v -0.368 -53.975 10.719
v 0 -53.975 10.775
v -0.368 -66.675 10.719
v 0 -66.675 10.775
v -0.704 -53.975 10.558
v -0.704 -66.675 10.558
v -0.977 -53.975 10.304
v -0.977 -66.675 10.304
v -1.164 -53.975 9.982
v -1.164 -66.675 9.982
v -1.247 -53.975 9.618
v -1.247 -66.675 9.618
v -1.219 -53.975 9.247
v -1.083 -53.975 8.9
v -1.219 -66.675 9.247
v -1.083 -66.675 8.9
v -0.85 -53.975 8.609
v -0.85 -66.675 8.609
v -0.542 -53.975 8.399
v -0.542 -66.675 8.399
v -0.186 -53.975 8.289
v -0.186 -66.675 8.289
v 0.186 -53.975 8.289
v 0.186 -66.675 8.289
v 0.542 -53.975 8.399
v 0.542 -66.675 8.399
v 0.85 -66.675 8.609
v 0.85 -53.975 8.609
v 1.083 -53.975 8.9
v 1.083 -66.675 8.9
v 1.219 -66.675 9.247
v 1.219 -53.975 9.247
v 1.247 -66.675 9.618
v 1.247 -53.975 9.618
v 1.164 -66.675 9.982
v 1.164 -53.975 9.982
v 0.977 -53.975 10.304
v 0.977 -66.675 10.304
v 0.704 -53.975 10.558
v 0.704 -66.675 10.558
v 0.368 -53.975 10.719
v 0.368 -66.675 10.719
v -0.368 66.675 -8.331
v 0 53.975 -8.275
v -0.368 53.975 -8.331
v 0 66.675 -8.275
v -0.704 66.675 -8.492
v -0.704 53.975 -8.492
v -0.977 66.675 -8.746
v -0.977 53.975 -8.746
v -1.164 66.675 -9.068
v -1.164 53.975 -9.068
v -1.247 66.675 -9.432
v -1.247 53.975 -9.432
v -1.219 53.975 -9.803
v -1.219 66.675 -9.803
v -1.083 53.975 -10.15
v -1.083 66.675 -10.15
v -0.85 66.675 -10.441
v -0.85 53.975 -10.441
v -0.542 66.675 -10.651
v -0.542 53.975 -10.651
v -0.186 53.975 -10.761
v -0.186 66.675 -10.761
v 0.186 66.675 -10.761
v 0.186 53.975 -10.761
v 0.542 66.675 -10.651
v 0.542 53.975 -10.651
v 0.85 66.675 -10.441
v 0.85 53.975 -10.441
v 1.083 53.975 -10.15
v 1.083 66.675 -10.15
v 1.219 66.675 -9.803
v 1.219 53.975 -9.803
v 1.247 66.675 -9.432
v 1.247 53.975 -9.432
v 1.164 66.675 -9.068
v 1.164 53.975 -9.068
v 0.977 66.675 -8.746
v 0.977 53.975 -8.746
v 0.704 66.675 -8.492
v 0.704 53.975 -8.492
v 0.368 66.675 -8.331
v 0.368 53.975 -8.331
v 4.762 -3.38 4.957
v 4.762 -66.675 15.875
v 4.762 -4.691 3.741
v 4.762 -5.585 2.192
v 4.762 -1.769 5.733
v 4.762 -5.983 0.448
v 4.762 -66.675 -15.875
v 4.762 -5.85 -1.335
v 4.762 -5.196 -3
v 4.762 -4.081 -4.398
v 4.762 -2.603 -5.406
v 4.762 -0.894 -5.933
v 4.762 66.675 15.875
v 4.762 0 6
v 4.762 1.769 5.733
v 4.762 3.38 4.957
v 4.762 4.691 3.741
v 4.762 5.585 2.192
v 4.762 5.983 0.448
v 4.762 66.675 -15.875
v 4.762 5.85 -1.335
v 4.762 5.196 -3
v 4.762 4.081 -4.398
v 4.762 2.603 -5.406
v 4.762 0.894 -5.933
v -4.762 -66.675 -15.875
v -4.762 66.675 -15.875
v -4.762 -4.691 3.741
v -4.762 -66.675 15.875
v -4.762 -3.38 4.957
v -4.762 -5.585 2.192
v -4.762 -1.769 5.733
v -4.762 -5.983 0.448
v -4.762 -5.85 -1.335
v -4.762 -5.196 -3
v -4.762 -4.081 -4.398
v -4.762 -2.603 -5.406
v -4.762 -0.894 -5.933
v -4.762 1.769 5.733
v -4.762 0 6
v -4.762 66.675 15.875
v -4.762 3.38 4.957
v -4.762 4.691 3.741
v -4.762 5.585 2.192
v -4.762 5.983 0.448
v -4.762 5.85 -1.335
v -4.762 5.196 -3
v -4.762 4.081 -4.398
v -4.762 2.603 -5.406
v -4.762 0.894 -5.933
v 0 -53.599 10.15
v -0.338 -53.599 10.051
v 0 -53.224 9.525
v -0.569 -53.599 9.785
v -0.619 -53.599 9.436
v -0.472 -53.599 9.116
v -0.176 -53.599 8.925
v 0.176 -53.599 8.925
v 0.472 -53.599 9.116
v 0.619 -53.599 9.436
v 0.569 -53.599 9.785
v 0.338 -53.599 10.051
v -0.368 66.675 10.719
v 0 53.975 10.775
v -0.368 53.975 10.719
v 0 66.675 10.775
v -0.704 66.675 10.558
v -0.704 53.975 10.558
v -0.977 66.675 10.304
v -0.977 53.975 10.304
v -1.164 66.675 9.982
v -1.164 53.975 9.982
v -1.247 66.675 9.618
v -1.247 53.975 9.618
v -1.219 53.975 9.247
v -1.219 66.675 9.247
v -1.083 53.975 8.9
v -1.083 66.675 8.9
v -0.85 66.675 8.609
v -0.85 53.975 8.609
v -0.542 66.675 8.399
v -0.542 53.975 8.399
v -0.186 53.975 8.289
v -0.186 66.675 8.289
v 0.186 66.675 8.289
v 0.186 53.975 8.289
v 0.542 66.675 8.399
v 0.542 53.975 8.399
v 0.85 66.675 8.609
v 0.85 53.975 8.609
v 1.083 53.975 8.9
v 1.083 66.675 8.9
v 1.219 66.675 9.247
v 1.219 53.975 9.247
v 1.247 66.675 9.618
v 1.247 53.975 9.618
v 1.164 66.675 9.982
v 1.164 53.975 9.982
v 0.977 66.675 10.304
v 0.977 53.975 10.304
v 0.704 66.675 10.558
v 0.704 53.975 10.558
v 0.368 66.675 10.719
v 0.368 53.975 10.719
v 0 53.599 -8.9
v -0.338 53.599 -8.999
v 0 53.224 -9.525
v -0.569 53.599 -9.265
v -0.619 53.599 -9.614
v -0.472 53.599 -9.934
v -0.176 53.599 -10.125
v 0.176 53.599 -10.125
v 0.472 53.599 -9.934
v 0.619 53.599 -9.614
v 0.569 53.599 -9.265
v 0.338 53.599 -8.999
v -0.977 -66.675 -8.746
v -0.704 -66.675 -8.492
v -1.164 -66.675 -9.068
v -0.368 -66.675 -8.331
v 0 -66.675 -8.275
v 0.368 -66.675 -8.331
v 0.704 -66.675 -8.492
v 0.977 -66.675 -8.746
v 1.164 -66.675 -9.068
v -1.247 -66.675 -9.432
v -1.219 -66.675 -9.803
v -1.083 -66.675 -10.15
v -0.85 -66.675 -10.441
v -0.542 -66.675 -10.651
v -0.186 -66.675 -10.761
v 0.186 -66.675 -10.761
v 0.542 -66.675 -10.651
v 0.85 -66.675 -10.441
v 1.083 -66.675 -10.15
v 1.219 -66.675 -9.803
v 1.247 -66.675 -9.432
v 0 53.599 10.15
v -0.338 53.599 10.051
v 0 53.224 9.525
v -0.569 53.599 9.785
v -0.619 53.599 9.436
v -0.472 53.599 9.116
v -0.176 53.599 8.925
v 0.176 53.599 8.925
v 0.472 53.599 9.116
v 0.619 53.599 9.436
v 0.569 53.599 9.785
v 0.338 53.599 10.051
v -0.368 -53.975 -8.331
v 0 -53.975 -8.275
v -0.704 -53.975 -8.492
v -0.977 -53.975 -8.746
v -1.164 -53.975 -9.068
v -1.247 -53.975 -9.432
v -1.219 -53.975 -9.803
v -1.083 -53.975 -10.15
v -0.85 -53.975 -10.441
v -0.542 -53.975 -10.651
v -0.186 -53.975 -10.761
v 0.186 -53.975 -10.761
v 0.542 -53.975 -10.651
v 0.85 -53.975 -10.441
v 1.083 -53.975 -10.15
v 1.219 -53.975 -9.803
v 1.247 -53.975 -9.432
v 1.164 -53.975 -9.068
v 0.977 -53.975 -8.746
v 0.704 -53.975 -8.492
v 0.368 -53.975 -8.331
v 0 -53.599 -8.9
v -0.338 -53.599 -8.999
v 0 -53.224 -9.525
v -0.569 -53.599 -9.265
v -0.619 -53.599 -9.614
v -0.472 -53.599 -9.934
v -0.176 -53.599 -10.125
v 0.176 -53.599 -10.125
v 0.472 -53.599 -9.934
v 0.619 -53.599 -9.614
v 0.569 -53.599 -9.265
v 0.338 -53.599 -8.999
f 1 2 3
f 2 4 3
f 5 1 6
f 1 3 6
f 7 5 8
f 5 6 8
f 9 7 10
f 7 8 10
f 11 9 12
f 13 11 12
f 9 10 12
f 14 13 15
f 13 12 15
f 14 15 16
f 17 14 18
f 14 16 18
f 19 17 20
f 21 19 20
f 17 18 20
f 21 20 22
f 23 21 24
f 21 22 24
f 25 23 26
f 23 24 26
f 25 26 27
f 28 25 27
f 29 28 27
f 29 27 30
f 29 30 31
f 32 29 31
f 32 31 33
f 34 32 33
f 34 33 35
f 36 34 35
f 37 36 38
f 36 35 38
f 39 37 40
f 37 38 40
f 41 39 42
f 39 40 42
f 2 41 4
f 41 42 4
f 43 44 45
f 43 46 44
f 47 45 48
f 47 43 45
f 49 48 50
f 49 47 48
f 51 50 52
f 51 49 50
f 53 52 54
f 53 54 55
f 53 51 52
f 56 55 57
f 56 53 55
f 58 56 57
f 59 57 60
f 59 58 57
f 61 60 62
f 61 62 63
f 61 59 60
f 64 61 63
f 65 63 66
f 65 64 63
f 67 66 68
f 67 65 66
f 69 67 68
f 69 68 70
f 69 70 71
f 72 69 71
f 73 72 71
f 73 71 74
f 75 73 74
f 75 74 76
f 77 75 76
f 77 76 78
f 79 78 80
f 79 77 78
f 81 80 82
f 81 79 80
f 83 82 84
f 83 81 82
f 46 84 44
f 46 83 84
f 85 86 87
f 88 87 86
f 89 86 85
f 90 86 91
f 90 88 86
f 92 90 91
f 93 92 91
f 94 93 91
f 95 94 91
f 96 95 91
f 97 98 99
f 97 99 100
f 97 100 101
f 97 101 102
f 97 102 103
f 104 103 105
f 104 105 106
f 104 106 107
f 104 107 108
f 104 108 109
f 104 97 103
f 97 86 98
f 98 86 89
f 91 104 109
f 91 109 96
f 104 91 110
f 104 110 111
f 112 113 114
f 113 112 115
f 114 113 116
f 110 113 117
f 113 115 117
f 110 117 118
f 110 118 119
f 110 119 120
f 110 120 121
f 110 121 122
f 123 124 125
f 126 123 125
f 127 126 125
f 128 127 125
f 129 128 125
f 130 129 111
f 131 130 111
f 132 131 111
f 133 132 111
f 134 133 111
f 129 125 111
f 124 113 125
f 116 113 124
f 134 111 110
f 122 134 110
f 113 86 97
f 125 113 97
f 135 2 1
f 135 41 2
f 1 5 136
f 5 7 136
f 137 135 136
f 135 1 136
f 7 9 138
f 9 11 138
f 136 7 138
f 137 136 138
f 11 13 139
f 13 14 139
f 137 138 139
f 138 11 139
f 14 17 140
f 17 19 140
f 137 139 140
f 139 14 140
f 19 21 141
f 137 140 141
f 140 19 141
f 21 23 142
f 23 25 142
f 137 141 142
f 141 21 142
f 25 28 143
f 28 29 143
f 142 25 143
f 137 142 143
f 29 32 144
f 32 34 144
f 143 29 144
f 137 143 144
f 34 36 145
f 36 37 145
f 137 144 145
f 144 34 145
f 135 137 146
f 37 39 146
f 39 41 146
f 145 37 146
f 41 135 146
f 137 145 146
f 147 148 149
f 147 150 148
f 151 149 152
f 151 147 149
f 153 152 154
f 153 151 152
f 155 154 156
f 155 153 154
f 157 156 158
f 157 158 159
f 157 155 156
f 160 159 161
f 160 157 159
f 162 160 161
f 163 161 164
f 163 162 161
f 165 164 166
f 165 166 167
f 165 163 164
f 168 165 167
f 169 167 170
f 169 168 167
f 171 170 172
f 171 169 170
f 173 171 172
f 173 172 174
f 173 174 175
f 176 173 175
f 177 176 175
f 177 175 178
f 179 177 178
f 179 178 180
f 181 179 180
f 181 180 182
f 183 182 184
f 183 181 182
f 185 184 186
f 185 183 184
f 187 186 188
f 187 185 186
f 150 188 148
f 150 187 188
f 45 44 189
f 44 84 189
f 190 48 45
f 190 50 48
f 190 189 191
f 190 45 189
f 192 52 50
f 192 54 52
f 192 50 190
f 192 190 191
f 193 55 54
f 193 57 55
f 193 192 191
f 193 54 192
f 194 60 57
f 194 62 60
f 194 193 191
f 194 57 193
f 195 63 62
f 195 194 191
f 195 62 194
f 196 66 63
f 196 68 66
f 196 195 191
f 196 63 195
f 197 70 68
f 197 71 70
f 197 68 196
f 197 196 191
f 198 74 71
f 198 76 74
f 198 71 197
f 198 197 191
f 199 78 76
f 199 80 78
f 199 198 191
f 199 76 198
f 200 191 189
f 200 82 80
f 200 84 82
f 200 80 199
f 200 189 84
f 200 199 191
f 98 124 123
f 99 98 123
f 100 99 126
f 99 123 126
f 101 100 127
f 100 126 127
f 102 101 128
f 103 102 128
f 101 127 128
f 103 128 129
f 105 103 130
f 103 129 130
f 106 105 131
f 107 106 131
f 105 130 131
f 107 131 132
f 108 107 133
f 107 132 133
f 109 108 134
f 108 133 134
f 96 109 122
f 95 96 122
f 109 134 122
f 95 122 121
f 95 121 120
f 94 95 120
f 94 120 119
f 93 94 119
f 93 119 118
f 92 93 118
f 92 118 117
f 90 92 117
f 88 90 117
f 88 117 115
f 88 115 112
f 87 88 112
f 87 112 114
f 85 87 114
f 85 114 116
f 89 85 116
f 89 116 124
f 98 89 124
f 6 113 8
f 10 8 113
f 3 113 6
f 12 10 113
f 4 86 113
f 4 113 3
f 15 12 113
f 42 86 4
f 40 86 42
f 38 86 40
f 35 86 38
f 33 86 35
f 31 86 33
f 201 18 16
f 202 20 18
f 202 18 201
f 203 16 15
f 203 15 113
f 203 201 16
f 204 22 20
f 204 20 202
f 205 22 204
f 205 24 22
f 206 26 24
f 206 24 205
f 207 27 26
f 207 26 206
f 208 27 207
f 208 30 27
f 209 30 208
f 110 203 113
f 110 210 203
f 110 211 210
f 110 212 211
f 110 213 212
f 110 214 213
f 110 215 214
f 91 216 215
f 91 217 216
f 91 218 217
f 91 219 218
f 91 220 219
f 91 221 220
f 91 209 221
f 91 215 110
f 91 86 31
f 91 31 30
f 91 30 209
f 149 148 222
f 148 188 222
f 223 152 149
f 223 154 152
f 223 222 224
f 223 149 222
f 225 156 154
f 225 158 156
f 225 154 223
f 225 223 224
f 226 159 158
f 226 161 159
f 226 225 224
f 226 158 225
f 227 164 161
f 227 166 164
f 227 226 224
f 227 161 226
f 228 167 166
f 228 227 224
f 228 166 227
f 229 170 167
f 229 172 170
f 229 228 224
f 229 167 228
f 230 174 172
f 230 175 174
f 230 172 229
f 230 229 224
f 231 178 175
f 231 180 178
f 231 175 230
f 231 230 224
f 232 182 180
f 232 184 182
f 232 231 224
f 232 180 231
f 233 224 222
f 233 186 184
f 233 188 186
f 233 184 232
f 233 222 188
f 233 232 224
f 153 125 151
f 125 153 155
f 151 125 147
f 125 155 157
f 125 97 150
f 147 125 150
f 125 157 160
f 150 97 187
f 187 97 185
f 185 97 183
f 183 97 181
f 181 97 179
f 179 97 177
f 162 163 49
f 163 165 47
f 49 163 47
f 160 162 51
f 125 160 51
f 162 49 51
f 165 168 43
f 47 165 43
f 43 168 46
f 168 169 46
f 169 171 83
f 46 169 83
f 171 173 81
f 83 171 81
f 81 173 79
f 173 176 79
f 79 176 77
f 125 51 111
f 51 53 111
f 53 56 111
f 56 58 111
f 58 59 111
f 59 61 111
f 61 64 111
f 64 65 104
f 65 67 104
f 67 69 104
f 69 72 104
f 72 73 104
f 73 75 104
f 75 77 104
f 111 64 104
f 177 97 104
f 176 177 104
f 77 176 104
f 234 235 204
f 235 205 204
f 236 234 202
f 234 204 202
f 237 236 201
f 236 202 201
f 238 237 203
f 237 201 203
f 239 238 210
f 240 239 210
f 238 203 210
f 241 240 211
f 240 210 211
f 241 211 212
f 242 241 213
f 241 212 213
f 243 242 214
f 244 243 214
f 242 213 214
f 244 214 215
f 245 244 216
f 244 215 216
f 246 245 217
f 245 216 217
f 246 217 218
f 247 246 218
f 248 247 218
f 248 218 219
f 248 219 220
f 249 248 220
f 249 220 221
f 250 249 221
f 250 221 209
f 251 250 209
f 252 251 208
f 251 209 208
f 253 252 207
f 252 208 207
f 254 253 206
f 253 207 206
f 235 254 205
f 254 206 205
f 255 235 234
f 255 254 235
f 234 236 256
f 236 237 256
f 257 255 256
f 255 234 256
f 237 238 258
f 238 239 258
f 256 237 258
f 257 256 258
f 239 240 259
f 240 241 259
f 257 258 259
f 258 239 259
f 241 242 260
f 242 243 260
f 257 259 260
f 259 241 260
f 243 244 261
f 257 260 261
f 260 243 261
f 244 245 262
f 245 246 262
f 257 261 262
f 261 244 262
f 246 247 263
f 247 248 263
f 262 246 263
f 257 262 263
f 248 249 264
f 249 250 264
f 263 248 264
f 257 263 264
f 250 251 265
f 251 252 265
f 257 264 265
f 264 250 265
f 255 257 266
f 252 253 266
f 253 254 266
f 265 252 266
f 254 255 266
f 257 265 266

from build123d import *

# Parameters (mm, degrees)
SKETCH1_W                      = 31.75
SKETCH1_H                      = 133.35
BOSS_EXTRUDE1_DEPTH            = 4.7625
M3X0_5_TAPPED_HOLE1_AT_2_COUNT = 2
M3X0_5_TAPPED_HOLE1_AT_2_PITCH = 19.05
F_12_0MM_DOWEL_HOLE1_D         = 12


with BuildPart() as part:
    # Sketch1 → Boss-Extrude1 (new, symmetric)
    with BuildSketch(Plane(origin=(0, 0, 0), x_dir=(0, 0, -1), z_dir=(1, 0, 0))):
        Rectangle(SKETCH1_W, SKETCH1_H)
    extrude(amount=BOSS_EXTRUDE1_DEPTH, both=True)

    # Sketch4 → M3x0.5 Tapped Hole1 (revolve, cut)
    with BuildSketch(Plane(origin=(0, 66.675, -9.525), x_dir=(0, 0, 1), z_dir=(1, 0, 0))):
        Polygon((0, 0), (0, 13.451075774), (1.25, 12.7), (1.25, 0), align=None)
    m3x0_5_tapped_hole1 = revolve(axis=Axis((0, 73.025, -9.525), (0, -1, 0)), mode=Mode.SUBTRACT)

    # M3x0.5 Tapped Hole1 at 2: M3x0.5 Tapped Hole1 ×2
    with Locations(*[(0, 0, i * M3X0_5_TAPPED_HOLE1_AT_2_PITCH) for i in range(1, M3X0_5_TAPPED_HOLE1_AT_2_COUNT)]):
        add(m3x0_5_tapped_hole1, mode=Mode.SUBTRACT)

    # Mirror1: M3x0.5 Tapped Hole1 across plane
    add(m3x0_5_tapped_hole1.mirror(Plane.ZX), mode=Mode.SUBTRACT)

    # Mirror1 copy 1 sketch → Mirror1 copy 1 (revolve, cut)
    with BuildSketch(Plane(origin=(0, -66.675, 9.525), x_dir=(0, 0, 1), z_dir=(1, 0, 0))):
        Polygon((0, 0), (0, -13.451075774), (1.25, -12.7), (1.25, 0), align=None)
    revolve(axis=Axis((0, -73.025, 9.525), (0, -1, 0)), mode=Mode.SUBTRACT)

    # Ø12.0mm Dowel Hole1 (through all)
    with Locations(Plane(origin=(4.7625, 0, 0), x_dir=(0, 0, -1), z_dir=(1, 0, 0))):
        with Locations((0, 0)):
            Hole(F_12_0MM_DOWEL_HOLE1_D / 2)


solid = part.part
